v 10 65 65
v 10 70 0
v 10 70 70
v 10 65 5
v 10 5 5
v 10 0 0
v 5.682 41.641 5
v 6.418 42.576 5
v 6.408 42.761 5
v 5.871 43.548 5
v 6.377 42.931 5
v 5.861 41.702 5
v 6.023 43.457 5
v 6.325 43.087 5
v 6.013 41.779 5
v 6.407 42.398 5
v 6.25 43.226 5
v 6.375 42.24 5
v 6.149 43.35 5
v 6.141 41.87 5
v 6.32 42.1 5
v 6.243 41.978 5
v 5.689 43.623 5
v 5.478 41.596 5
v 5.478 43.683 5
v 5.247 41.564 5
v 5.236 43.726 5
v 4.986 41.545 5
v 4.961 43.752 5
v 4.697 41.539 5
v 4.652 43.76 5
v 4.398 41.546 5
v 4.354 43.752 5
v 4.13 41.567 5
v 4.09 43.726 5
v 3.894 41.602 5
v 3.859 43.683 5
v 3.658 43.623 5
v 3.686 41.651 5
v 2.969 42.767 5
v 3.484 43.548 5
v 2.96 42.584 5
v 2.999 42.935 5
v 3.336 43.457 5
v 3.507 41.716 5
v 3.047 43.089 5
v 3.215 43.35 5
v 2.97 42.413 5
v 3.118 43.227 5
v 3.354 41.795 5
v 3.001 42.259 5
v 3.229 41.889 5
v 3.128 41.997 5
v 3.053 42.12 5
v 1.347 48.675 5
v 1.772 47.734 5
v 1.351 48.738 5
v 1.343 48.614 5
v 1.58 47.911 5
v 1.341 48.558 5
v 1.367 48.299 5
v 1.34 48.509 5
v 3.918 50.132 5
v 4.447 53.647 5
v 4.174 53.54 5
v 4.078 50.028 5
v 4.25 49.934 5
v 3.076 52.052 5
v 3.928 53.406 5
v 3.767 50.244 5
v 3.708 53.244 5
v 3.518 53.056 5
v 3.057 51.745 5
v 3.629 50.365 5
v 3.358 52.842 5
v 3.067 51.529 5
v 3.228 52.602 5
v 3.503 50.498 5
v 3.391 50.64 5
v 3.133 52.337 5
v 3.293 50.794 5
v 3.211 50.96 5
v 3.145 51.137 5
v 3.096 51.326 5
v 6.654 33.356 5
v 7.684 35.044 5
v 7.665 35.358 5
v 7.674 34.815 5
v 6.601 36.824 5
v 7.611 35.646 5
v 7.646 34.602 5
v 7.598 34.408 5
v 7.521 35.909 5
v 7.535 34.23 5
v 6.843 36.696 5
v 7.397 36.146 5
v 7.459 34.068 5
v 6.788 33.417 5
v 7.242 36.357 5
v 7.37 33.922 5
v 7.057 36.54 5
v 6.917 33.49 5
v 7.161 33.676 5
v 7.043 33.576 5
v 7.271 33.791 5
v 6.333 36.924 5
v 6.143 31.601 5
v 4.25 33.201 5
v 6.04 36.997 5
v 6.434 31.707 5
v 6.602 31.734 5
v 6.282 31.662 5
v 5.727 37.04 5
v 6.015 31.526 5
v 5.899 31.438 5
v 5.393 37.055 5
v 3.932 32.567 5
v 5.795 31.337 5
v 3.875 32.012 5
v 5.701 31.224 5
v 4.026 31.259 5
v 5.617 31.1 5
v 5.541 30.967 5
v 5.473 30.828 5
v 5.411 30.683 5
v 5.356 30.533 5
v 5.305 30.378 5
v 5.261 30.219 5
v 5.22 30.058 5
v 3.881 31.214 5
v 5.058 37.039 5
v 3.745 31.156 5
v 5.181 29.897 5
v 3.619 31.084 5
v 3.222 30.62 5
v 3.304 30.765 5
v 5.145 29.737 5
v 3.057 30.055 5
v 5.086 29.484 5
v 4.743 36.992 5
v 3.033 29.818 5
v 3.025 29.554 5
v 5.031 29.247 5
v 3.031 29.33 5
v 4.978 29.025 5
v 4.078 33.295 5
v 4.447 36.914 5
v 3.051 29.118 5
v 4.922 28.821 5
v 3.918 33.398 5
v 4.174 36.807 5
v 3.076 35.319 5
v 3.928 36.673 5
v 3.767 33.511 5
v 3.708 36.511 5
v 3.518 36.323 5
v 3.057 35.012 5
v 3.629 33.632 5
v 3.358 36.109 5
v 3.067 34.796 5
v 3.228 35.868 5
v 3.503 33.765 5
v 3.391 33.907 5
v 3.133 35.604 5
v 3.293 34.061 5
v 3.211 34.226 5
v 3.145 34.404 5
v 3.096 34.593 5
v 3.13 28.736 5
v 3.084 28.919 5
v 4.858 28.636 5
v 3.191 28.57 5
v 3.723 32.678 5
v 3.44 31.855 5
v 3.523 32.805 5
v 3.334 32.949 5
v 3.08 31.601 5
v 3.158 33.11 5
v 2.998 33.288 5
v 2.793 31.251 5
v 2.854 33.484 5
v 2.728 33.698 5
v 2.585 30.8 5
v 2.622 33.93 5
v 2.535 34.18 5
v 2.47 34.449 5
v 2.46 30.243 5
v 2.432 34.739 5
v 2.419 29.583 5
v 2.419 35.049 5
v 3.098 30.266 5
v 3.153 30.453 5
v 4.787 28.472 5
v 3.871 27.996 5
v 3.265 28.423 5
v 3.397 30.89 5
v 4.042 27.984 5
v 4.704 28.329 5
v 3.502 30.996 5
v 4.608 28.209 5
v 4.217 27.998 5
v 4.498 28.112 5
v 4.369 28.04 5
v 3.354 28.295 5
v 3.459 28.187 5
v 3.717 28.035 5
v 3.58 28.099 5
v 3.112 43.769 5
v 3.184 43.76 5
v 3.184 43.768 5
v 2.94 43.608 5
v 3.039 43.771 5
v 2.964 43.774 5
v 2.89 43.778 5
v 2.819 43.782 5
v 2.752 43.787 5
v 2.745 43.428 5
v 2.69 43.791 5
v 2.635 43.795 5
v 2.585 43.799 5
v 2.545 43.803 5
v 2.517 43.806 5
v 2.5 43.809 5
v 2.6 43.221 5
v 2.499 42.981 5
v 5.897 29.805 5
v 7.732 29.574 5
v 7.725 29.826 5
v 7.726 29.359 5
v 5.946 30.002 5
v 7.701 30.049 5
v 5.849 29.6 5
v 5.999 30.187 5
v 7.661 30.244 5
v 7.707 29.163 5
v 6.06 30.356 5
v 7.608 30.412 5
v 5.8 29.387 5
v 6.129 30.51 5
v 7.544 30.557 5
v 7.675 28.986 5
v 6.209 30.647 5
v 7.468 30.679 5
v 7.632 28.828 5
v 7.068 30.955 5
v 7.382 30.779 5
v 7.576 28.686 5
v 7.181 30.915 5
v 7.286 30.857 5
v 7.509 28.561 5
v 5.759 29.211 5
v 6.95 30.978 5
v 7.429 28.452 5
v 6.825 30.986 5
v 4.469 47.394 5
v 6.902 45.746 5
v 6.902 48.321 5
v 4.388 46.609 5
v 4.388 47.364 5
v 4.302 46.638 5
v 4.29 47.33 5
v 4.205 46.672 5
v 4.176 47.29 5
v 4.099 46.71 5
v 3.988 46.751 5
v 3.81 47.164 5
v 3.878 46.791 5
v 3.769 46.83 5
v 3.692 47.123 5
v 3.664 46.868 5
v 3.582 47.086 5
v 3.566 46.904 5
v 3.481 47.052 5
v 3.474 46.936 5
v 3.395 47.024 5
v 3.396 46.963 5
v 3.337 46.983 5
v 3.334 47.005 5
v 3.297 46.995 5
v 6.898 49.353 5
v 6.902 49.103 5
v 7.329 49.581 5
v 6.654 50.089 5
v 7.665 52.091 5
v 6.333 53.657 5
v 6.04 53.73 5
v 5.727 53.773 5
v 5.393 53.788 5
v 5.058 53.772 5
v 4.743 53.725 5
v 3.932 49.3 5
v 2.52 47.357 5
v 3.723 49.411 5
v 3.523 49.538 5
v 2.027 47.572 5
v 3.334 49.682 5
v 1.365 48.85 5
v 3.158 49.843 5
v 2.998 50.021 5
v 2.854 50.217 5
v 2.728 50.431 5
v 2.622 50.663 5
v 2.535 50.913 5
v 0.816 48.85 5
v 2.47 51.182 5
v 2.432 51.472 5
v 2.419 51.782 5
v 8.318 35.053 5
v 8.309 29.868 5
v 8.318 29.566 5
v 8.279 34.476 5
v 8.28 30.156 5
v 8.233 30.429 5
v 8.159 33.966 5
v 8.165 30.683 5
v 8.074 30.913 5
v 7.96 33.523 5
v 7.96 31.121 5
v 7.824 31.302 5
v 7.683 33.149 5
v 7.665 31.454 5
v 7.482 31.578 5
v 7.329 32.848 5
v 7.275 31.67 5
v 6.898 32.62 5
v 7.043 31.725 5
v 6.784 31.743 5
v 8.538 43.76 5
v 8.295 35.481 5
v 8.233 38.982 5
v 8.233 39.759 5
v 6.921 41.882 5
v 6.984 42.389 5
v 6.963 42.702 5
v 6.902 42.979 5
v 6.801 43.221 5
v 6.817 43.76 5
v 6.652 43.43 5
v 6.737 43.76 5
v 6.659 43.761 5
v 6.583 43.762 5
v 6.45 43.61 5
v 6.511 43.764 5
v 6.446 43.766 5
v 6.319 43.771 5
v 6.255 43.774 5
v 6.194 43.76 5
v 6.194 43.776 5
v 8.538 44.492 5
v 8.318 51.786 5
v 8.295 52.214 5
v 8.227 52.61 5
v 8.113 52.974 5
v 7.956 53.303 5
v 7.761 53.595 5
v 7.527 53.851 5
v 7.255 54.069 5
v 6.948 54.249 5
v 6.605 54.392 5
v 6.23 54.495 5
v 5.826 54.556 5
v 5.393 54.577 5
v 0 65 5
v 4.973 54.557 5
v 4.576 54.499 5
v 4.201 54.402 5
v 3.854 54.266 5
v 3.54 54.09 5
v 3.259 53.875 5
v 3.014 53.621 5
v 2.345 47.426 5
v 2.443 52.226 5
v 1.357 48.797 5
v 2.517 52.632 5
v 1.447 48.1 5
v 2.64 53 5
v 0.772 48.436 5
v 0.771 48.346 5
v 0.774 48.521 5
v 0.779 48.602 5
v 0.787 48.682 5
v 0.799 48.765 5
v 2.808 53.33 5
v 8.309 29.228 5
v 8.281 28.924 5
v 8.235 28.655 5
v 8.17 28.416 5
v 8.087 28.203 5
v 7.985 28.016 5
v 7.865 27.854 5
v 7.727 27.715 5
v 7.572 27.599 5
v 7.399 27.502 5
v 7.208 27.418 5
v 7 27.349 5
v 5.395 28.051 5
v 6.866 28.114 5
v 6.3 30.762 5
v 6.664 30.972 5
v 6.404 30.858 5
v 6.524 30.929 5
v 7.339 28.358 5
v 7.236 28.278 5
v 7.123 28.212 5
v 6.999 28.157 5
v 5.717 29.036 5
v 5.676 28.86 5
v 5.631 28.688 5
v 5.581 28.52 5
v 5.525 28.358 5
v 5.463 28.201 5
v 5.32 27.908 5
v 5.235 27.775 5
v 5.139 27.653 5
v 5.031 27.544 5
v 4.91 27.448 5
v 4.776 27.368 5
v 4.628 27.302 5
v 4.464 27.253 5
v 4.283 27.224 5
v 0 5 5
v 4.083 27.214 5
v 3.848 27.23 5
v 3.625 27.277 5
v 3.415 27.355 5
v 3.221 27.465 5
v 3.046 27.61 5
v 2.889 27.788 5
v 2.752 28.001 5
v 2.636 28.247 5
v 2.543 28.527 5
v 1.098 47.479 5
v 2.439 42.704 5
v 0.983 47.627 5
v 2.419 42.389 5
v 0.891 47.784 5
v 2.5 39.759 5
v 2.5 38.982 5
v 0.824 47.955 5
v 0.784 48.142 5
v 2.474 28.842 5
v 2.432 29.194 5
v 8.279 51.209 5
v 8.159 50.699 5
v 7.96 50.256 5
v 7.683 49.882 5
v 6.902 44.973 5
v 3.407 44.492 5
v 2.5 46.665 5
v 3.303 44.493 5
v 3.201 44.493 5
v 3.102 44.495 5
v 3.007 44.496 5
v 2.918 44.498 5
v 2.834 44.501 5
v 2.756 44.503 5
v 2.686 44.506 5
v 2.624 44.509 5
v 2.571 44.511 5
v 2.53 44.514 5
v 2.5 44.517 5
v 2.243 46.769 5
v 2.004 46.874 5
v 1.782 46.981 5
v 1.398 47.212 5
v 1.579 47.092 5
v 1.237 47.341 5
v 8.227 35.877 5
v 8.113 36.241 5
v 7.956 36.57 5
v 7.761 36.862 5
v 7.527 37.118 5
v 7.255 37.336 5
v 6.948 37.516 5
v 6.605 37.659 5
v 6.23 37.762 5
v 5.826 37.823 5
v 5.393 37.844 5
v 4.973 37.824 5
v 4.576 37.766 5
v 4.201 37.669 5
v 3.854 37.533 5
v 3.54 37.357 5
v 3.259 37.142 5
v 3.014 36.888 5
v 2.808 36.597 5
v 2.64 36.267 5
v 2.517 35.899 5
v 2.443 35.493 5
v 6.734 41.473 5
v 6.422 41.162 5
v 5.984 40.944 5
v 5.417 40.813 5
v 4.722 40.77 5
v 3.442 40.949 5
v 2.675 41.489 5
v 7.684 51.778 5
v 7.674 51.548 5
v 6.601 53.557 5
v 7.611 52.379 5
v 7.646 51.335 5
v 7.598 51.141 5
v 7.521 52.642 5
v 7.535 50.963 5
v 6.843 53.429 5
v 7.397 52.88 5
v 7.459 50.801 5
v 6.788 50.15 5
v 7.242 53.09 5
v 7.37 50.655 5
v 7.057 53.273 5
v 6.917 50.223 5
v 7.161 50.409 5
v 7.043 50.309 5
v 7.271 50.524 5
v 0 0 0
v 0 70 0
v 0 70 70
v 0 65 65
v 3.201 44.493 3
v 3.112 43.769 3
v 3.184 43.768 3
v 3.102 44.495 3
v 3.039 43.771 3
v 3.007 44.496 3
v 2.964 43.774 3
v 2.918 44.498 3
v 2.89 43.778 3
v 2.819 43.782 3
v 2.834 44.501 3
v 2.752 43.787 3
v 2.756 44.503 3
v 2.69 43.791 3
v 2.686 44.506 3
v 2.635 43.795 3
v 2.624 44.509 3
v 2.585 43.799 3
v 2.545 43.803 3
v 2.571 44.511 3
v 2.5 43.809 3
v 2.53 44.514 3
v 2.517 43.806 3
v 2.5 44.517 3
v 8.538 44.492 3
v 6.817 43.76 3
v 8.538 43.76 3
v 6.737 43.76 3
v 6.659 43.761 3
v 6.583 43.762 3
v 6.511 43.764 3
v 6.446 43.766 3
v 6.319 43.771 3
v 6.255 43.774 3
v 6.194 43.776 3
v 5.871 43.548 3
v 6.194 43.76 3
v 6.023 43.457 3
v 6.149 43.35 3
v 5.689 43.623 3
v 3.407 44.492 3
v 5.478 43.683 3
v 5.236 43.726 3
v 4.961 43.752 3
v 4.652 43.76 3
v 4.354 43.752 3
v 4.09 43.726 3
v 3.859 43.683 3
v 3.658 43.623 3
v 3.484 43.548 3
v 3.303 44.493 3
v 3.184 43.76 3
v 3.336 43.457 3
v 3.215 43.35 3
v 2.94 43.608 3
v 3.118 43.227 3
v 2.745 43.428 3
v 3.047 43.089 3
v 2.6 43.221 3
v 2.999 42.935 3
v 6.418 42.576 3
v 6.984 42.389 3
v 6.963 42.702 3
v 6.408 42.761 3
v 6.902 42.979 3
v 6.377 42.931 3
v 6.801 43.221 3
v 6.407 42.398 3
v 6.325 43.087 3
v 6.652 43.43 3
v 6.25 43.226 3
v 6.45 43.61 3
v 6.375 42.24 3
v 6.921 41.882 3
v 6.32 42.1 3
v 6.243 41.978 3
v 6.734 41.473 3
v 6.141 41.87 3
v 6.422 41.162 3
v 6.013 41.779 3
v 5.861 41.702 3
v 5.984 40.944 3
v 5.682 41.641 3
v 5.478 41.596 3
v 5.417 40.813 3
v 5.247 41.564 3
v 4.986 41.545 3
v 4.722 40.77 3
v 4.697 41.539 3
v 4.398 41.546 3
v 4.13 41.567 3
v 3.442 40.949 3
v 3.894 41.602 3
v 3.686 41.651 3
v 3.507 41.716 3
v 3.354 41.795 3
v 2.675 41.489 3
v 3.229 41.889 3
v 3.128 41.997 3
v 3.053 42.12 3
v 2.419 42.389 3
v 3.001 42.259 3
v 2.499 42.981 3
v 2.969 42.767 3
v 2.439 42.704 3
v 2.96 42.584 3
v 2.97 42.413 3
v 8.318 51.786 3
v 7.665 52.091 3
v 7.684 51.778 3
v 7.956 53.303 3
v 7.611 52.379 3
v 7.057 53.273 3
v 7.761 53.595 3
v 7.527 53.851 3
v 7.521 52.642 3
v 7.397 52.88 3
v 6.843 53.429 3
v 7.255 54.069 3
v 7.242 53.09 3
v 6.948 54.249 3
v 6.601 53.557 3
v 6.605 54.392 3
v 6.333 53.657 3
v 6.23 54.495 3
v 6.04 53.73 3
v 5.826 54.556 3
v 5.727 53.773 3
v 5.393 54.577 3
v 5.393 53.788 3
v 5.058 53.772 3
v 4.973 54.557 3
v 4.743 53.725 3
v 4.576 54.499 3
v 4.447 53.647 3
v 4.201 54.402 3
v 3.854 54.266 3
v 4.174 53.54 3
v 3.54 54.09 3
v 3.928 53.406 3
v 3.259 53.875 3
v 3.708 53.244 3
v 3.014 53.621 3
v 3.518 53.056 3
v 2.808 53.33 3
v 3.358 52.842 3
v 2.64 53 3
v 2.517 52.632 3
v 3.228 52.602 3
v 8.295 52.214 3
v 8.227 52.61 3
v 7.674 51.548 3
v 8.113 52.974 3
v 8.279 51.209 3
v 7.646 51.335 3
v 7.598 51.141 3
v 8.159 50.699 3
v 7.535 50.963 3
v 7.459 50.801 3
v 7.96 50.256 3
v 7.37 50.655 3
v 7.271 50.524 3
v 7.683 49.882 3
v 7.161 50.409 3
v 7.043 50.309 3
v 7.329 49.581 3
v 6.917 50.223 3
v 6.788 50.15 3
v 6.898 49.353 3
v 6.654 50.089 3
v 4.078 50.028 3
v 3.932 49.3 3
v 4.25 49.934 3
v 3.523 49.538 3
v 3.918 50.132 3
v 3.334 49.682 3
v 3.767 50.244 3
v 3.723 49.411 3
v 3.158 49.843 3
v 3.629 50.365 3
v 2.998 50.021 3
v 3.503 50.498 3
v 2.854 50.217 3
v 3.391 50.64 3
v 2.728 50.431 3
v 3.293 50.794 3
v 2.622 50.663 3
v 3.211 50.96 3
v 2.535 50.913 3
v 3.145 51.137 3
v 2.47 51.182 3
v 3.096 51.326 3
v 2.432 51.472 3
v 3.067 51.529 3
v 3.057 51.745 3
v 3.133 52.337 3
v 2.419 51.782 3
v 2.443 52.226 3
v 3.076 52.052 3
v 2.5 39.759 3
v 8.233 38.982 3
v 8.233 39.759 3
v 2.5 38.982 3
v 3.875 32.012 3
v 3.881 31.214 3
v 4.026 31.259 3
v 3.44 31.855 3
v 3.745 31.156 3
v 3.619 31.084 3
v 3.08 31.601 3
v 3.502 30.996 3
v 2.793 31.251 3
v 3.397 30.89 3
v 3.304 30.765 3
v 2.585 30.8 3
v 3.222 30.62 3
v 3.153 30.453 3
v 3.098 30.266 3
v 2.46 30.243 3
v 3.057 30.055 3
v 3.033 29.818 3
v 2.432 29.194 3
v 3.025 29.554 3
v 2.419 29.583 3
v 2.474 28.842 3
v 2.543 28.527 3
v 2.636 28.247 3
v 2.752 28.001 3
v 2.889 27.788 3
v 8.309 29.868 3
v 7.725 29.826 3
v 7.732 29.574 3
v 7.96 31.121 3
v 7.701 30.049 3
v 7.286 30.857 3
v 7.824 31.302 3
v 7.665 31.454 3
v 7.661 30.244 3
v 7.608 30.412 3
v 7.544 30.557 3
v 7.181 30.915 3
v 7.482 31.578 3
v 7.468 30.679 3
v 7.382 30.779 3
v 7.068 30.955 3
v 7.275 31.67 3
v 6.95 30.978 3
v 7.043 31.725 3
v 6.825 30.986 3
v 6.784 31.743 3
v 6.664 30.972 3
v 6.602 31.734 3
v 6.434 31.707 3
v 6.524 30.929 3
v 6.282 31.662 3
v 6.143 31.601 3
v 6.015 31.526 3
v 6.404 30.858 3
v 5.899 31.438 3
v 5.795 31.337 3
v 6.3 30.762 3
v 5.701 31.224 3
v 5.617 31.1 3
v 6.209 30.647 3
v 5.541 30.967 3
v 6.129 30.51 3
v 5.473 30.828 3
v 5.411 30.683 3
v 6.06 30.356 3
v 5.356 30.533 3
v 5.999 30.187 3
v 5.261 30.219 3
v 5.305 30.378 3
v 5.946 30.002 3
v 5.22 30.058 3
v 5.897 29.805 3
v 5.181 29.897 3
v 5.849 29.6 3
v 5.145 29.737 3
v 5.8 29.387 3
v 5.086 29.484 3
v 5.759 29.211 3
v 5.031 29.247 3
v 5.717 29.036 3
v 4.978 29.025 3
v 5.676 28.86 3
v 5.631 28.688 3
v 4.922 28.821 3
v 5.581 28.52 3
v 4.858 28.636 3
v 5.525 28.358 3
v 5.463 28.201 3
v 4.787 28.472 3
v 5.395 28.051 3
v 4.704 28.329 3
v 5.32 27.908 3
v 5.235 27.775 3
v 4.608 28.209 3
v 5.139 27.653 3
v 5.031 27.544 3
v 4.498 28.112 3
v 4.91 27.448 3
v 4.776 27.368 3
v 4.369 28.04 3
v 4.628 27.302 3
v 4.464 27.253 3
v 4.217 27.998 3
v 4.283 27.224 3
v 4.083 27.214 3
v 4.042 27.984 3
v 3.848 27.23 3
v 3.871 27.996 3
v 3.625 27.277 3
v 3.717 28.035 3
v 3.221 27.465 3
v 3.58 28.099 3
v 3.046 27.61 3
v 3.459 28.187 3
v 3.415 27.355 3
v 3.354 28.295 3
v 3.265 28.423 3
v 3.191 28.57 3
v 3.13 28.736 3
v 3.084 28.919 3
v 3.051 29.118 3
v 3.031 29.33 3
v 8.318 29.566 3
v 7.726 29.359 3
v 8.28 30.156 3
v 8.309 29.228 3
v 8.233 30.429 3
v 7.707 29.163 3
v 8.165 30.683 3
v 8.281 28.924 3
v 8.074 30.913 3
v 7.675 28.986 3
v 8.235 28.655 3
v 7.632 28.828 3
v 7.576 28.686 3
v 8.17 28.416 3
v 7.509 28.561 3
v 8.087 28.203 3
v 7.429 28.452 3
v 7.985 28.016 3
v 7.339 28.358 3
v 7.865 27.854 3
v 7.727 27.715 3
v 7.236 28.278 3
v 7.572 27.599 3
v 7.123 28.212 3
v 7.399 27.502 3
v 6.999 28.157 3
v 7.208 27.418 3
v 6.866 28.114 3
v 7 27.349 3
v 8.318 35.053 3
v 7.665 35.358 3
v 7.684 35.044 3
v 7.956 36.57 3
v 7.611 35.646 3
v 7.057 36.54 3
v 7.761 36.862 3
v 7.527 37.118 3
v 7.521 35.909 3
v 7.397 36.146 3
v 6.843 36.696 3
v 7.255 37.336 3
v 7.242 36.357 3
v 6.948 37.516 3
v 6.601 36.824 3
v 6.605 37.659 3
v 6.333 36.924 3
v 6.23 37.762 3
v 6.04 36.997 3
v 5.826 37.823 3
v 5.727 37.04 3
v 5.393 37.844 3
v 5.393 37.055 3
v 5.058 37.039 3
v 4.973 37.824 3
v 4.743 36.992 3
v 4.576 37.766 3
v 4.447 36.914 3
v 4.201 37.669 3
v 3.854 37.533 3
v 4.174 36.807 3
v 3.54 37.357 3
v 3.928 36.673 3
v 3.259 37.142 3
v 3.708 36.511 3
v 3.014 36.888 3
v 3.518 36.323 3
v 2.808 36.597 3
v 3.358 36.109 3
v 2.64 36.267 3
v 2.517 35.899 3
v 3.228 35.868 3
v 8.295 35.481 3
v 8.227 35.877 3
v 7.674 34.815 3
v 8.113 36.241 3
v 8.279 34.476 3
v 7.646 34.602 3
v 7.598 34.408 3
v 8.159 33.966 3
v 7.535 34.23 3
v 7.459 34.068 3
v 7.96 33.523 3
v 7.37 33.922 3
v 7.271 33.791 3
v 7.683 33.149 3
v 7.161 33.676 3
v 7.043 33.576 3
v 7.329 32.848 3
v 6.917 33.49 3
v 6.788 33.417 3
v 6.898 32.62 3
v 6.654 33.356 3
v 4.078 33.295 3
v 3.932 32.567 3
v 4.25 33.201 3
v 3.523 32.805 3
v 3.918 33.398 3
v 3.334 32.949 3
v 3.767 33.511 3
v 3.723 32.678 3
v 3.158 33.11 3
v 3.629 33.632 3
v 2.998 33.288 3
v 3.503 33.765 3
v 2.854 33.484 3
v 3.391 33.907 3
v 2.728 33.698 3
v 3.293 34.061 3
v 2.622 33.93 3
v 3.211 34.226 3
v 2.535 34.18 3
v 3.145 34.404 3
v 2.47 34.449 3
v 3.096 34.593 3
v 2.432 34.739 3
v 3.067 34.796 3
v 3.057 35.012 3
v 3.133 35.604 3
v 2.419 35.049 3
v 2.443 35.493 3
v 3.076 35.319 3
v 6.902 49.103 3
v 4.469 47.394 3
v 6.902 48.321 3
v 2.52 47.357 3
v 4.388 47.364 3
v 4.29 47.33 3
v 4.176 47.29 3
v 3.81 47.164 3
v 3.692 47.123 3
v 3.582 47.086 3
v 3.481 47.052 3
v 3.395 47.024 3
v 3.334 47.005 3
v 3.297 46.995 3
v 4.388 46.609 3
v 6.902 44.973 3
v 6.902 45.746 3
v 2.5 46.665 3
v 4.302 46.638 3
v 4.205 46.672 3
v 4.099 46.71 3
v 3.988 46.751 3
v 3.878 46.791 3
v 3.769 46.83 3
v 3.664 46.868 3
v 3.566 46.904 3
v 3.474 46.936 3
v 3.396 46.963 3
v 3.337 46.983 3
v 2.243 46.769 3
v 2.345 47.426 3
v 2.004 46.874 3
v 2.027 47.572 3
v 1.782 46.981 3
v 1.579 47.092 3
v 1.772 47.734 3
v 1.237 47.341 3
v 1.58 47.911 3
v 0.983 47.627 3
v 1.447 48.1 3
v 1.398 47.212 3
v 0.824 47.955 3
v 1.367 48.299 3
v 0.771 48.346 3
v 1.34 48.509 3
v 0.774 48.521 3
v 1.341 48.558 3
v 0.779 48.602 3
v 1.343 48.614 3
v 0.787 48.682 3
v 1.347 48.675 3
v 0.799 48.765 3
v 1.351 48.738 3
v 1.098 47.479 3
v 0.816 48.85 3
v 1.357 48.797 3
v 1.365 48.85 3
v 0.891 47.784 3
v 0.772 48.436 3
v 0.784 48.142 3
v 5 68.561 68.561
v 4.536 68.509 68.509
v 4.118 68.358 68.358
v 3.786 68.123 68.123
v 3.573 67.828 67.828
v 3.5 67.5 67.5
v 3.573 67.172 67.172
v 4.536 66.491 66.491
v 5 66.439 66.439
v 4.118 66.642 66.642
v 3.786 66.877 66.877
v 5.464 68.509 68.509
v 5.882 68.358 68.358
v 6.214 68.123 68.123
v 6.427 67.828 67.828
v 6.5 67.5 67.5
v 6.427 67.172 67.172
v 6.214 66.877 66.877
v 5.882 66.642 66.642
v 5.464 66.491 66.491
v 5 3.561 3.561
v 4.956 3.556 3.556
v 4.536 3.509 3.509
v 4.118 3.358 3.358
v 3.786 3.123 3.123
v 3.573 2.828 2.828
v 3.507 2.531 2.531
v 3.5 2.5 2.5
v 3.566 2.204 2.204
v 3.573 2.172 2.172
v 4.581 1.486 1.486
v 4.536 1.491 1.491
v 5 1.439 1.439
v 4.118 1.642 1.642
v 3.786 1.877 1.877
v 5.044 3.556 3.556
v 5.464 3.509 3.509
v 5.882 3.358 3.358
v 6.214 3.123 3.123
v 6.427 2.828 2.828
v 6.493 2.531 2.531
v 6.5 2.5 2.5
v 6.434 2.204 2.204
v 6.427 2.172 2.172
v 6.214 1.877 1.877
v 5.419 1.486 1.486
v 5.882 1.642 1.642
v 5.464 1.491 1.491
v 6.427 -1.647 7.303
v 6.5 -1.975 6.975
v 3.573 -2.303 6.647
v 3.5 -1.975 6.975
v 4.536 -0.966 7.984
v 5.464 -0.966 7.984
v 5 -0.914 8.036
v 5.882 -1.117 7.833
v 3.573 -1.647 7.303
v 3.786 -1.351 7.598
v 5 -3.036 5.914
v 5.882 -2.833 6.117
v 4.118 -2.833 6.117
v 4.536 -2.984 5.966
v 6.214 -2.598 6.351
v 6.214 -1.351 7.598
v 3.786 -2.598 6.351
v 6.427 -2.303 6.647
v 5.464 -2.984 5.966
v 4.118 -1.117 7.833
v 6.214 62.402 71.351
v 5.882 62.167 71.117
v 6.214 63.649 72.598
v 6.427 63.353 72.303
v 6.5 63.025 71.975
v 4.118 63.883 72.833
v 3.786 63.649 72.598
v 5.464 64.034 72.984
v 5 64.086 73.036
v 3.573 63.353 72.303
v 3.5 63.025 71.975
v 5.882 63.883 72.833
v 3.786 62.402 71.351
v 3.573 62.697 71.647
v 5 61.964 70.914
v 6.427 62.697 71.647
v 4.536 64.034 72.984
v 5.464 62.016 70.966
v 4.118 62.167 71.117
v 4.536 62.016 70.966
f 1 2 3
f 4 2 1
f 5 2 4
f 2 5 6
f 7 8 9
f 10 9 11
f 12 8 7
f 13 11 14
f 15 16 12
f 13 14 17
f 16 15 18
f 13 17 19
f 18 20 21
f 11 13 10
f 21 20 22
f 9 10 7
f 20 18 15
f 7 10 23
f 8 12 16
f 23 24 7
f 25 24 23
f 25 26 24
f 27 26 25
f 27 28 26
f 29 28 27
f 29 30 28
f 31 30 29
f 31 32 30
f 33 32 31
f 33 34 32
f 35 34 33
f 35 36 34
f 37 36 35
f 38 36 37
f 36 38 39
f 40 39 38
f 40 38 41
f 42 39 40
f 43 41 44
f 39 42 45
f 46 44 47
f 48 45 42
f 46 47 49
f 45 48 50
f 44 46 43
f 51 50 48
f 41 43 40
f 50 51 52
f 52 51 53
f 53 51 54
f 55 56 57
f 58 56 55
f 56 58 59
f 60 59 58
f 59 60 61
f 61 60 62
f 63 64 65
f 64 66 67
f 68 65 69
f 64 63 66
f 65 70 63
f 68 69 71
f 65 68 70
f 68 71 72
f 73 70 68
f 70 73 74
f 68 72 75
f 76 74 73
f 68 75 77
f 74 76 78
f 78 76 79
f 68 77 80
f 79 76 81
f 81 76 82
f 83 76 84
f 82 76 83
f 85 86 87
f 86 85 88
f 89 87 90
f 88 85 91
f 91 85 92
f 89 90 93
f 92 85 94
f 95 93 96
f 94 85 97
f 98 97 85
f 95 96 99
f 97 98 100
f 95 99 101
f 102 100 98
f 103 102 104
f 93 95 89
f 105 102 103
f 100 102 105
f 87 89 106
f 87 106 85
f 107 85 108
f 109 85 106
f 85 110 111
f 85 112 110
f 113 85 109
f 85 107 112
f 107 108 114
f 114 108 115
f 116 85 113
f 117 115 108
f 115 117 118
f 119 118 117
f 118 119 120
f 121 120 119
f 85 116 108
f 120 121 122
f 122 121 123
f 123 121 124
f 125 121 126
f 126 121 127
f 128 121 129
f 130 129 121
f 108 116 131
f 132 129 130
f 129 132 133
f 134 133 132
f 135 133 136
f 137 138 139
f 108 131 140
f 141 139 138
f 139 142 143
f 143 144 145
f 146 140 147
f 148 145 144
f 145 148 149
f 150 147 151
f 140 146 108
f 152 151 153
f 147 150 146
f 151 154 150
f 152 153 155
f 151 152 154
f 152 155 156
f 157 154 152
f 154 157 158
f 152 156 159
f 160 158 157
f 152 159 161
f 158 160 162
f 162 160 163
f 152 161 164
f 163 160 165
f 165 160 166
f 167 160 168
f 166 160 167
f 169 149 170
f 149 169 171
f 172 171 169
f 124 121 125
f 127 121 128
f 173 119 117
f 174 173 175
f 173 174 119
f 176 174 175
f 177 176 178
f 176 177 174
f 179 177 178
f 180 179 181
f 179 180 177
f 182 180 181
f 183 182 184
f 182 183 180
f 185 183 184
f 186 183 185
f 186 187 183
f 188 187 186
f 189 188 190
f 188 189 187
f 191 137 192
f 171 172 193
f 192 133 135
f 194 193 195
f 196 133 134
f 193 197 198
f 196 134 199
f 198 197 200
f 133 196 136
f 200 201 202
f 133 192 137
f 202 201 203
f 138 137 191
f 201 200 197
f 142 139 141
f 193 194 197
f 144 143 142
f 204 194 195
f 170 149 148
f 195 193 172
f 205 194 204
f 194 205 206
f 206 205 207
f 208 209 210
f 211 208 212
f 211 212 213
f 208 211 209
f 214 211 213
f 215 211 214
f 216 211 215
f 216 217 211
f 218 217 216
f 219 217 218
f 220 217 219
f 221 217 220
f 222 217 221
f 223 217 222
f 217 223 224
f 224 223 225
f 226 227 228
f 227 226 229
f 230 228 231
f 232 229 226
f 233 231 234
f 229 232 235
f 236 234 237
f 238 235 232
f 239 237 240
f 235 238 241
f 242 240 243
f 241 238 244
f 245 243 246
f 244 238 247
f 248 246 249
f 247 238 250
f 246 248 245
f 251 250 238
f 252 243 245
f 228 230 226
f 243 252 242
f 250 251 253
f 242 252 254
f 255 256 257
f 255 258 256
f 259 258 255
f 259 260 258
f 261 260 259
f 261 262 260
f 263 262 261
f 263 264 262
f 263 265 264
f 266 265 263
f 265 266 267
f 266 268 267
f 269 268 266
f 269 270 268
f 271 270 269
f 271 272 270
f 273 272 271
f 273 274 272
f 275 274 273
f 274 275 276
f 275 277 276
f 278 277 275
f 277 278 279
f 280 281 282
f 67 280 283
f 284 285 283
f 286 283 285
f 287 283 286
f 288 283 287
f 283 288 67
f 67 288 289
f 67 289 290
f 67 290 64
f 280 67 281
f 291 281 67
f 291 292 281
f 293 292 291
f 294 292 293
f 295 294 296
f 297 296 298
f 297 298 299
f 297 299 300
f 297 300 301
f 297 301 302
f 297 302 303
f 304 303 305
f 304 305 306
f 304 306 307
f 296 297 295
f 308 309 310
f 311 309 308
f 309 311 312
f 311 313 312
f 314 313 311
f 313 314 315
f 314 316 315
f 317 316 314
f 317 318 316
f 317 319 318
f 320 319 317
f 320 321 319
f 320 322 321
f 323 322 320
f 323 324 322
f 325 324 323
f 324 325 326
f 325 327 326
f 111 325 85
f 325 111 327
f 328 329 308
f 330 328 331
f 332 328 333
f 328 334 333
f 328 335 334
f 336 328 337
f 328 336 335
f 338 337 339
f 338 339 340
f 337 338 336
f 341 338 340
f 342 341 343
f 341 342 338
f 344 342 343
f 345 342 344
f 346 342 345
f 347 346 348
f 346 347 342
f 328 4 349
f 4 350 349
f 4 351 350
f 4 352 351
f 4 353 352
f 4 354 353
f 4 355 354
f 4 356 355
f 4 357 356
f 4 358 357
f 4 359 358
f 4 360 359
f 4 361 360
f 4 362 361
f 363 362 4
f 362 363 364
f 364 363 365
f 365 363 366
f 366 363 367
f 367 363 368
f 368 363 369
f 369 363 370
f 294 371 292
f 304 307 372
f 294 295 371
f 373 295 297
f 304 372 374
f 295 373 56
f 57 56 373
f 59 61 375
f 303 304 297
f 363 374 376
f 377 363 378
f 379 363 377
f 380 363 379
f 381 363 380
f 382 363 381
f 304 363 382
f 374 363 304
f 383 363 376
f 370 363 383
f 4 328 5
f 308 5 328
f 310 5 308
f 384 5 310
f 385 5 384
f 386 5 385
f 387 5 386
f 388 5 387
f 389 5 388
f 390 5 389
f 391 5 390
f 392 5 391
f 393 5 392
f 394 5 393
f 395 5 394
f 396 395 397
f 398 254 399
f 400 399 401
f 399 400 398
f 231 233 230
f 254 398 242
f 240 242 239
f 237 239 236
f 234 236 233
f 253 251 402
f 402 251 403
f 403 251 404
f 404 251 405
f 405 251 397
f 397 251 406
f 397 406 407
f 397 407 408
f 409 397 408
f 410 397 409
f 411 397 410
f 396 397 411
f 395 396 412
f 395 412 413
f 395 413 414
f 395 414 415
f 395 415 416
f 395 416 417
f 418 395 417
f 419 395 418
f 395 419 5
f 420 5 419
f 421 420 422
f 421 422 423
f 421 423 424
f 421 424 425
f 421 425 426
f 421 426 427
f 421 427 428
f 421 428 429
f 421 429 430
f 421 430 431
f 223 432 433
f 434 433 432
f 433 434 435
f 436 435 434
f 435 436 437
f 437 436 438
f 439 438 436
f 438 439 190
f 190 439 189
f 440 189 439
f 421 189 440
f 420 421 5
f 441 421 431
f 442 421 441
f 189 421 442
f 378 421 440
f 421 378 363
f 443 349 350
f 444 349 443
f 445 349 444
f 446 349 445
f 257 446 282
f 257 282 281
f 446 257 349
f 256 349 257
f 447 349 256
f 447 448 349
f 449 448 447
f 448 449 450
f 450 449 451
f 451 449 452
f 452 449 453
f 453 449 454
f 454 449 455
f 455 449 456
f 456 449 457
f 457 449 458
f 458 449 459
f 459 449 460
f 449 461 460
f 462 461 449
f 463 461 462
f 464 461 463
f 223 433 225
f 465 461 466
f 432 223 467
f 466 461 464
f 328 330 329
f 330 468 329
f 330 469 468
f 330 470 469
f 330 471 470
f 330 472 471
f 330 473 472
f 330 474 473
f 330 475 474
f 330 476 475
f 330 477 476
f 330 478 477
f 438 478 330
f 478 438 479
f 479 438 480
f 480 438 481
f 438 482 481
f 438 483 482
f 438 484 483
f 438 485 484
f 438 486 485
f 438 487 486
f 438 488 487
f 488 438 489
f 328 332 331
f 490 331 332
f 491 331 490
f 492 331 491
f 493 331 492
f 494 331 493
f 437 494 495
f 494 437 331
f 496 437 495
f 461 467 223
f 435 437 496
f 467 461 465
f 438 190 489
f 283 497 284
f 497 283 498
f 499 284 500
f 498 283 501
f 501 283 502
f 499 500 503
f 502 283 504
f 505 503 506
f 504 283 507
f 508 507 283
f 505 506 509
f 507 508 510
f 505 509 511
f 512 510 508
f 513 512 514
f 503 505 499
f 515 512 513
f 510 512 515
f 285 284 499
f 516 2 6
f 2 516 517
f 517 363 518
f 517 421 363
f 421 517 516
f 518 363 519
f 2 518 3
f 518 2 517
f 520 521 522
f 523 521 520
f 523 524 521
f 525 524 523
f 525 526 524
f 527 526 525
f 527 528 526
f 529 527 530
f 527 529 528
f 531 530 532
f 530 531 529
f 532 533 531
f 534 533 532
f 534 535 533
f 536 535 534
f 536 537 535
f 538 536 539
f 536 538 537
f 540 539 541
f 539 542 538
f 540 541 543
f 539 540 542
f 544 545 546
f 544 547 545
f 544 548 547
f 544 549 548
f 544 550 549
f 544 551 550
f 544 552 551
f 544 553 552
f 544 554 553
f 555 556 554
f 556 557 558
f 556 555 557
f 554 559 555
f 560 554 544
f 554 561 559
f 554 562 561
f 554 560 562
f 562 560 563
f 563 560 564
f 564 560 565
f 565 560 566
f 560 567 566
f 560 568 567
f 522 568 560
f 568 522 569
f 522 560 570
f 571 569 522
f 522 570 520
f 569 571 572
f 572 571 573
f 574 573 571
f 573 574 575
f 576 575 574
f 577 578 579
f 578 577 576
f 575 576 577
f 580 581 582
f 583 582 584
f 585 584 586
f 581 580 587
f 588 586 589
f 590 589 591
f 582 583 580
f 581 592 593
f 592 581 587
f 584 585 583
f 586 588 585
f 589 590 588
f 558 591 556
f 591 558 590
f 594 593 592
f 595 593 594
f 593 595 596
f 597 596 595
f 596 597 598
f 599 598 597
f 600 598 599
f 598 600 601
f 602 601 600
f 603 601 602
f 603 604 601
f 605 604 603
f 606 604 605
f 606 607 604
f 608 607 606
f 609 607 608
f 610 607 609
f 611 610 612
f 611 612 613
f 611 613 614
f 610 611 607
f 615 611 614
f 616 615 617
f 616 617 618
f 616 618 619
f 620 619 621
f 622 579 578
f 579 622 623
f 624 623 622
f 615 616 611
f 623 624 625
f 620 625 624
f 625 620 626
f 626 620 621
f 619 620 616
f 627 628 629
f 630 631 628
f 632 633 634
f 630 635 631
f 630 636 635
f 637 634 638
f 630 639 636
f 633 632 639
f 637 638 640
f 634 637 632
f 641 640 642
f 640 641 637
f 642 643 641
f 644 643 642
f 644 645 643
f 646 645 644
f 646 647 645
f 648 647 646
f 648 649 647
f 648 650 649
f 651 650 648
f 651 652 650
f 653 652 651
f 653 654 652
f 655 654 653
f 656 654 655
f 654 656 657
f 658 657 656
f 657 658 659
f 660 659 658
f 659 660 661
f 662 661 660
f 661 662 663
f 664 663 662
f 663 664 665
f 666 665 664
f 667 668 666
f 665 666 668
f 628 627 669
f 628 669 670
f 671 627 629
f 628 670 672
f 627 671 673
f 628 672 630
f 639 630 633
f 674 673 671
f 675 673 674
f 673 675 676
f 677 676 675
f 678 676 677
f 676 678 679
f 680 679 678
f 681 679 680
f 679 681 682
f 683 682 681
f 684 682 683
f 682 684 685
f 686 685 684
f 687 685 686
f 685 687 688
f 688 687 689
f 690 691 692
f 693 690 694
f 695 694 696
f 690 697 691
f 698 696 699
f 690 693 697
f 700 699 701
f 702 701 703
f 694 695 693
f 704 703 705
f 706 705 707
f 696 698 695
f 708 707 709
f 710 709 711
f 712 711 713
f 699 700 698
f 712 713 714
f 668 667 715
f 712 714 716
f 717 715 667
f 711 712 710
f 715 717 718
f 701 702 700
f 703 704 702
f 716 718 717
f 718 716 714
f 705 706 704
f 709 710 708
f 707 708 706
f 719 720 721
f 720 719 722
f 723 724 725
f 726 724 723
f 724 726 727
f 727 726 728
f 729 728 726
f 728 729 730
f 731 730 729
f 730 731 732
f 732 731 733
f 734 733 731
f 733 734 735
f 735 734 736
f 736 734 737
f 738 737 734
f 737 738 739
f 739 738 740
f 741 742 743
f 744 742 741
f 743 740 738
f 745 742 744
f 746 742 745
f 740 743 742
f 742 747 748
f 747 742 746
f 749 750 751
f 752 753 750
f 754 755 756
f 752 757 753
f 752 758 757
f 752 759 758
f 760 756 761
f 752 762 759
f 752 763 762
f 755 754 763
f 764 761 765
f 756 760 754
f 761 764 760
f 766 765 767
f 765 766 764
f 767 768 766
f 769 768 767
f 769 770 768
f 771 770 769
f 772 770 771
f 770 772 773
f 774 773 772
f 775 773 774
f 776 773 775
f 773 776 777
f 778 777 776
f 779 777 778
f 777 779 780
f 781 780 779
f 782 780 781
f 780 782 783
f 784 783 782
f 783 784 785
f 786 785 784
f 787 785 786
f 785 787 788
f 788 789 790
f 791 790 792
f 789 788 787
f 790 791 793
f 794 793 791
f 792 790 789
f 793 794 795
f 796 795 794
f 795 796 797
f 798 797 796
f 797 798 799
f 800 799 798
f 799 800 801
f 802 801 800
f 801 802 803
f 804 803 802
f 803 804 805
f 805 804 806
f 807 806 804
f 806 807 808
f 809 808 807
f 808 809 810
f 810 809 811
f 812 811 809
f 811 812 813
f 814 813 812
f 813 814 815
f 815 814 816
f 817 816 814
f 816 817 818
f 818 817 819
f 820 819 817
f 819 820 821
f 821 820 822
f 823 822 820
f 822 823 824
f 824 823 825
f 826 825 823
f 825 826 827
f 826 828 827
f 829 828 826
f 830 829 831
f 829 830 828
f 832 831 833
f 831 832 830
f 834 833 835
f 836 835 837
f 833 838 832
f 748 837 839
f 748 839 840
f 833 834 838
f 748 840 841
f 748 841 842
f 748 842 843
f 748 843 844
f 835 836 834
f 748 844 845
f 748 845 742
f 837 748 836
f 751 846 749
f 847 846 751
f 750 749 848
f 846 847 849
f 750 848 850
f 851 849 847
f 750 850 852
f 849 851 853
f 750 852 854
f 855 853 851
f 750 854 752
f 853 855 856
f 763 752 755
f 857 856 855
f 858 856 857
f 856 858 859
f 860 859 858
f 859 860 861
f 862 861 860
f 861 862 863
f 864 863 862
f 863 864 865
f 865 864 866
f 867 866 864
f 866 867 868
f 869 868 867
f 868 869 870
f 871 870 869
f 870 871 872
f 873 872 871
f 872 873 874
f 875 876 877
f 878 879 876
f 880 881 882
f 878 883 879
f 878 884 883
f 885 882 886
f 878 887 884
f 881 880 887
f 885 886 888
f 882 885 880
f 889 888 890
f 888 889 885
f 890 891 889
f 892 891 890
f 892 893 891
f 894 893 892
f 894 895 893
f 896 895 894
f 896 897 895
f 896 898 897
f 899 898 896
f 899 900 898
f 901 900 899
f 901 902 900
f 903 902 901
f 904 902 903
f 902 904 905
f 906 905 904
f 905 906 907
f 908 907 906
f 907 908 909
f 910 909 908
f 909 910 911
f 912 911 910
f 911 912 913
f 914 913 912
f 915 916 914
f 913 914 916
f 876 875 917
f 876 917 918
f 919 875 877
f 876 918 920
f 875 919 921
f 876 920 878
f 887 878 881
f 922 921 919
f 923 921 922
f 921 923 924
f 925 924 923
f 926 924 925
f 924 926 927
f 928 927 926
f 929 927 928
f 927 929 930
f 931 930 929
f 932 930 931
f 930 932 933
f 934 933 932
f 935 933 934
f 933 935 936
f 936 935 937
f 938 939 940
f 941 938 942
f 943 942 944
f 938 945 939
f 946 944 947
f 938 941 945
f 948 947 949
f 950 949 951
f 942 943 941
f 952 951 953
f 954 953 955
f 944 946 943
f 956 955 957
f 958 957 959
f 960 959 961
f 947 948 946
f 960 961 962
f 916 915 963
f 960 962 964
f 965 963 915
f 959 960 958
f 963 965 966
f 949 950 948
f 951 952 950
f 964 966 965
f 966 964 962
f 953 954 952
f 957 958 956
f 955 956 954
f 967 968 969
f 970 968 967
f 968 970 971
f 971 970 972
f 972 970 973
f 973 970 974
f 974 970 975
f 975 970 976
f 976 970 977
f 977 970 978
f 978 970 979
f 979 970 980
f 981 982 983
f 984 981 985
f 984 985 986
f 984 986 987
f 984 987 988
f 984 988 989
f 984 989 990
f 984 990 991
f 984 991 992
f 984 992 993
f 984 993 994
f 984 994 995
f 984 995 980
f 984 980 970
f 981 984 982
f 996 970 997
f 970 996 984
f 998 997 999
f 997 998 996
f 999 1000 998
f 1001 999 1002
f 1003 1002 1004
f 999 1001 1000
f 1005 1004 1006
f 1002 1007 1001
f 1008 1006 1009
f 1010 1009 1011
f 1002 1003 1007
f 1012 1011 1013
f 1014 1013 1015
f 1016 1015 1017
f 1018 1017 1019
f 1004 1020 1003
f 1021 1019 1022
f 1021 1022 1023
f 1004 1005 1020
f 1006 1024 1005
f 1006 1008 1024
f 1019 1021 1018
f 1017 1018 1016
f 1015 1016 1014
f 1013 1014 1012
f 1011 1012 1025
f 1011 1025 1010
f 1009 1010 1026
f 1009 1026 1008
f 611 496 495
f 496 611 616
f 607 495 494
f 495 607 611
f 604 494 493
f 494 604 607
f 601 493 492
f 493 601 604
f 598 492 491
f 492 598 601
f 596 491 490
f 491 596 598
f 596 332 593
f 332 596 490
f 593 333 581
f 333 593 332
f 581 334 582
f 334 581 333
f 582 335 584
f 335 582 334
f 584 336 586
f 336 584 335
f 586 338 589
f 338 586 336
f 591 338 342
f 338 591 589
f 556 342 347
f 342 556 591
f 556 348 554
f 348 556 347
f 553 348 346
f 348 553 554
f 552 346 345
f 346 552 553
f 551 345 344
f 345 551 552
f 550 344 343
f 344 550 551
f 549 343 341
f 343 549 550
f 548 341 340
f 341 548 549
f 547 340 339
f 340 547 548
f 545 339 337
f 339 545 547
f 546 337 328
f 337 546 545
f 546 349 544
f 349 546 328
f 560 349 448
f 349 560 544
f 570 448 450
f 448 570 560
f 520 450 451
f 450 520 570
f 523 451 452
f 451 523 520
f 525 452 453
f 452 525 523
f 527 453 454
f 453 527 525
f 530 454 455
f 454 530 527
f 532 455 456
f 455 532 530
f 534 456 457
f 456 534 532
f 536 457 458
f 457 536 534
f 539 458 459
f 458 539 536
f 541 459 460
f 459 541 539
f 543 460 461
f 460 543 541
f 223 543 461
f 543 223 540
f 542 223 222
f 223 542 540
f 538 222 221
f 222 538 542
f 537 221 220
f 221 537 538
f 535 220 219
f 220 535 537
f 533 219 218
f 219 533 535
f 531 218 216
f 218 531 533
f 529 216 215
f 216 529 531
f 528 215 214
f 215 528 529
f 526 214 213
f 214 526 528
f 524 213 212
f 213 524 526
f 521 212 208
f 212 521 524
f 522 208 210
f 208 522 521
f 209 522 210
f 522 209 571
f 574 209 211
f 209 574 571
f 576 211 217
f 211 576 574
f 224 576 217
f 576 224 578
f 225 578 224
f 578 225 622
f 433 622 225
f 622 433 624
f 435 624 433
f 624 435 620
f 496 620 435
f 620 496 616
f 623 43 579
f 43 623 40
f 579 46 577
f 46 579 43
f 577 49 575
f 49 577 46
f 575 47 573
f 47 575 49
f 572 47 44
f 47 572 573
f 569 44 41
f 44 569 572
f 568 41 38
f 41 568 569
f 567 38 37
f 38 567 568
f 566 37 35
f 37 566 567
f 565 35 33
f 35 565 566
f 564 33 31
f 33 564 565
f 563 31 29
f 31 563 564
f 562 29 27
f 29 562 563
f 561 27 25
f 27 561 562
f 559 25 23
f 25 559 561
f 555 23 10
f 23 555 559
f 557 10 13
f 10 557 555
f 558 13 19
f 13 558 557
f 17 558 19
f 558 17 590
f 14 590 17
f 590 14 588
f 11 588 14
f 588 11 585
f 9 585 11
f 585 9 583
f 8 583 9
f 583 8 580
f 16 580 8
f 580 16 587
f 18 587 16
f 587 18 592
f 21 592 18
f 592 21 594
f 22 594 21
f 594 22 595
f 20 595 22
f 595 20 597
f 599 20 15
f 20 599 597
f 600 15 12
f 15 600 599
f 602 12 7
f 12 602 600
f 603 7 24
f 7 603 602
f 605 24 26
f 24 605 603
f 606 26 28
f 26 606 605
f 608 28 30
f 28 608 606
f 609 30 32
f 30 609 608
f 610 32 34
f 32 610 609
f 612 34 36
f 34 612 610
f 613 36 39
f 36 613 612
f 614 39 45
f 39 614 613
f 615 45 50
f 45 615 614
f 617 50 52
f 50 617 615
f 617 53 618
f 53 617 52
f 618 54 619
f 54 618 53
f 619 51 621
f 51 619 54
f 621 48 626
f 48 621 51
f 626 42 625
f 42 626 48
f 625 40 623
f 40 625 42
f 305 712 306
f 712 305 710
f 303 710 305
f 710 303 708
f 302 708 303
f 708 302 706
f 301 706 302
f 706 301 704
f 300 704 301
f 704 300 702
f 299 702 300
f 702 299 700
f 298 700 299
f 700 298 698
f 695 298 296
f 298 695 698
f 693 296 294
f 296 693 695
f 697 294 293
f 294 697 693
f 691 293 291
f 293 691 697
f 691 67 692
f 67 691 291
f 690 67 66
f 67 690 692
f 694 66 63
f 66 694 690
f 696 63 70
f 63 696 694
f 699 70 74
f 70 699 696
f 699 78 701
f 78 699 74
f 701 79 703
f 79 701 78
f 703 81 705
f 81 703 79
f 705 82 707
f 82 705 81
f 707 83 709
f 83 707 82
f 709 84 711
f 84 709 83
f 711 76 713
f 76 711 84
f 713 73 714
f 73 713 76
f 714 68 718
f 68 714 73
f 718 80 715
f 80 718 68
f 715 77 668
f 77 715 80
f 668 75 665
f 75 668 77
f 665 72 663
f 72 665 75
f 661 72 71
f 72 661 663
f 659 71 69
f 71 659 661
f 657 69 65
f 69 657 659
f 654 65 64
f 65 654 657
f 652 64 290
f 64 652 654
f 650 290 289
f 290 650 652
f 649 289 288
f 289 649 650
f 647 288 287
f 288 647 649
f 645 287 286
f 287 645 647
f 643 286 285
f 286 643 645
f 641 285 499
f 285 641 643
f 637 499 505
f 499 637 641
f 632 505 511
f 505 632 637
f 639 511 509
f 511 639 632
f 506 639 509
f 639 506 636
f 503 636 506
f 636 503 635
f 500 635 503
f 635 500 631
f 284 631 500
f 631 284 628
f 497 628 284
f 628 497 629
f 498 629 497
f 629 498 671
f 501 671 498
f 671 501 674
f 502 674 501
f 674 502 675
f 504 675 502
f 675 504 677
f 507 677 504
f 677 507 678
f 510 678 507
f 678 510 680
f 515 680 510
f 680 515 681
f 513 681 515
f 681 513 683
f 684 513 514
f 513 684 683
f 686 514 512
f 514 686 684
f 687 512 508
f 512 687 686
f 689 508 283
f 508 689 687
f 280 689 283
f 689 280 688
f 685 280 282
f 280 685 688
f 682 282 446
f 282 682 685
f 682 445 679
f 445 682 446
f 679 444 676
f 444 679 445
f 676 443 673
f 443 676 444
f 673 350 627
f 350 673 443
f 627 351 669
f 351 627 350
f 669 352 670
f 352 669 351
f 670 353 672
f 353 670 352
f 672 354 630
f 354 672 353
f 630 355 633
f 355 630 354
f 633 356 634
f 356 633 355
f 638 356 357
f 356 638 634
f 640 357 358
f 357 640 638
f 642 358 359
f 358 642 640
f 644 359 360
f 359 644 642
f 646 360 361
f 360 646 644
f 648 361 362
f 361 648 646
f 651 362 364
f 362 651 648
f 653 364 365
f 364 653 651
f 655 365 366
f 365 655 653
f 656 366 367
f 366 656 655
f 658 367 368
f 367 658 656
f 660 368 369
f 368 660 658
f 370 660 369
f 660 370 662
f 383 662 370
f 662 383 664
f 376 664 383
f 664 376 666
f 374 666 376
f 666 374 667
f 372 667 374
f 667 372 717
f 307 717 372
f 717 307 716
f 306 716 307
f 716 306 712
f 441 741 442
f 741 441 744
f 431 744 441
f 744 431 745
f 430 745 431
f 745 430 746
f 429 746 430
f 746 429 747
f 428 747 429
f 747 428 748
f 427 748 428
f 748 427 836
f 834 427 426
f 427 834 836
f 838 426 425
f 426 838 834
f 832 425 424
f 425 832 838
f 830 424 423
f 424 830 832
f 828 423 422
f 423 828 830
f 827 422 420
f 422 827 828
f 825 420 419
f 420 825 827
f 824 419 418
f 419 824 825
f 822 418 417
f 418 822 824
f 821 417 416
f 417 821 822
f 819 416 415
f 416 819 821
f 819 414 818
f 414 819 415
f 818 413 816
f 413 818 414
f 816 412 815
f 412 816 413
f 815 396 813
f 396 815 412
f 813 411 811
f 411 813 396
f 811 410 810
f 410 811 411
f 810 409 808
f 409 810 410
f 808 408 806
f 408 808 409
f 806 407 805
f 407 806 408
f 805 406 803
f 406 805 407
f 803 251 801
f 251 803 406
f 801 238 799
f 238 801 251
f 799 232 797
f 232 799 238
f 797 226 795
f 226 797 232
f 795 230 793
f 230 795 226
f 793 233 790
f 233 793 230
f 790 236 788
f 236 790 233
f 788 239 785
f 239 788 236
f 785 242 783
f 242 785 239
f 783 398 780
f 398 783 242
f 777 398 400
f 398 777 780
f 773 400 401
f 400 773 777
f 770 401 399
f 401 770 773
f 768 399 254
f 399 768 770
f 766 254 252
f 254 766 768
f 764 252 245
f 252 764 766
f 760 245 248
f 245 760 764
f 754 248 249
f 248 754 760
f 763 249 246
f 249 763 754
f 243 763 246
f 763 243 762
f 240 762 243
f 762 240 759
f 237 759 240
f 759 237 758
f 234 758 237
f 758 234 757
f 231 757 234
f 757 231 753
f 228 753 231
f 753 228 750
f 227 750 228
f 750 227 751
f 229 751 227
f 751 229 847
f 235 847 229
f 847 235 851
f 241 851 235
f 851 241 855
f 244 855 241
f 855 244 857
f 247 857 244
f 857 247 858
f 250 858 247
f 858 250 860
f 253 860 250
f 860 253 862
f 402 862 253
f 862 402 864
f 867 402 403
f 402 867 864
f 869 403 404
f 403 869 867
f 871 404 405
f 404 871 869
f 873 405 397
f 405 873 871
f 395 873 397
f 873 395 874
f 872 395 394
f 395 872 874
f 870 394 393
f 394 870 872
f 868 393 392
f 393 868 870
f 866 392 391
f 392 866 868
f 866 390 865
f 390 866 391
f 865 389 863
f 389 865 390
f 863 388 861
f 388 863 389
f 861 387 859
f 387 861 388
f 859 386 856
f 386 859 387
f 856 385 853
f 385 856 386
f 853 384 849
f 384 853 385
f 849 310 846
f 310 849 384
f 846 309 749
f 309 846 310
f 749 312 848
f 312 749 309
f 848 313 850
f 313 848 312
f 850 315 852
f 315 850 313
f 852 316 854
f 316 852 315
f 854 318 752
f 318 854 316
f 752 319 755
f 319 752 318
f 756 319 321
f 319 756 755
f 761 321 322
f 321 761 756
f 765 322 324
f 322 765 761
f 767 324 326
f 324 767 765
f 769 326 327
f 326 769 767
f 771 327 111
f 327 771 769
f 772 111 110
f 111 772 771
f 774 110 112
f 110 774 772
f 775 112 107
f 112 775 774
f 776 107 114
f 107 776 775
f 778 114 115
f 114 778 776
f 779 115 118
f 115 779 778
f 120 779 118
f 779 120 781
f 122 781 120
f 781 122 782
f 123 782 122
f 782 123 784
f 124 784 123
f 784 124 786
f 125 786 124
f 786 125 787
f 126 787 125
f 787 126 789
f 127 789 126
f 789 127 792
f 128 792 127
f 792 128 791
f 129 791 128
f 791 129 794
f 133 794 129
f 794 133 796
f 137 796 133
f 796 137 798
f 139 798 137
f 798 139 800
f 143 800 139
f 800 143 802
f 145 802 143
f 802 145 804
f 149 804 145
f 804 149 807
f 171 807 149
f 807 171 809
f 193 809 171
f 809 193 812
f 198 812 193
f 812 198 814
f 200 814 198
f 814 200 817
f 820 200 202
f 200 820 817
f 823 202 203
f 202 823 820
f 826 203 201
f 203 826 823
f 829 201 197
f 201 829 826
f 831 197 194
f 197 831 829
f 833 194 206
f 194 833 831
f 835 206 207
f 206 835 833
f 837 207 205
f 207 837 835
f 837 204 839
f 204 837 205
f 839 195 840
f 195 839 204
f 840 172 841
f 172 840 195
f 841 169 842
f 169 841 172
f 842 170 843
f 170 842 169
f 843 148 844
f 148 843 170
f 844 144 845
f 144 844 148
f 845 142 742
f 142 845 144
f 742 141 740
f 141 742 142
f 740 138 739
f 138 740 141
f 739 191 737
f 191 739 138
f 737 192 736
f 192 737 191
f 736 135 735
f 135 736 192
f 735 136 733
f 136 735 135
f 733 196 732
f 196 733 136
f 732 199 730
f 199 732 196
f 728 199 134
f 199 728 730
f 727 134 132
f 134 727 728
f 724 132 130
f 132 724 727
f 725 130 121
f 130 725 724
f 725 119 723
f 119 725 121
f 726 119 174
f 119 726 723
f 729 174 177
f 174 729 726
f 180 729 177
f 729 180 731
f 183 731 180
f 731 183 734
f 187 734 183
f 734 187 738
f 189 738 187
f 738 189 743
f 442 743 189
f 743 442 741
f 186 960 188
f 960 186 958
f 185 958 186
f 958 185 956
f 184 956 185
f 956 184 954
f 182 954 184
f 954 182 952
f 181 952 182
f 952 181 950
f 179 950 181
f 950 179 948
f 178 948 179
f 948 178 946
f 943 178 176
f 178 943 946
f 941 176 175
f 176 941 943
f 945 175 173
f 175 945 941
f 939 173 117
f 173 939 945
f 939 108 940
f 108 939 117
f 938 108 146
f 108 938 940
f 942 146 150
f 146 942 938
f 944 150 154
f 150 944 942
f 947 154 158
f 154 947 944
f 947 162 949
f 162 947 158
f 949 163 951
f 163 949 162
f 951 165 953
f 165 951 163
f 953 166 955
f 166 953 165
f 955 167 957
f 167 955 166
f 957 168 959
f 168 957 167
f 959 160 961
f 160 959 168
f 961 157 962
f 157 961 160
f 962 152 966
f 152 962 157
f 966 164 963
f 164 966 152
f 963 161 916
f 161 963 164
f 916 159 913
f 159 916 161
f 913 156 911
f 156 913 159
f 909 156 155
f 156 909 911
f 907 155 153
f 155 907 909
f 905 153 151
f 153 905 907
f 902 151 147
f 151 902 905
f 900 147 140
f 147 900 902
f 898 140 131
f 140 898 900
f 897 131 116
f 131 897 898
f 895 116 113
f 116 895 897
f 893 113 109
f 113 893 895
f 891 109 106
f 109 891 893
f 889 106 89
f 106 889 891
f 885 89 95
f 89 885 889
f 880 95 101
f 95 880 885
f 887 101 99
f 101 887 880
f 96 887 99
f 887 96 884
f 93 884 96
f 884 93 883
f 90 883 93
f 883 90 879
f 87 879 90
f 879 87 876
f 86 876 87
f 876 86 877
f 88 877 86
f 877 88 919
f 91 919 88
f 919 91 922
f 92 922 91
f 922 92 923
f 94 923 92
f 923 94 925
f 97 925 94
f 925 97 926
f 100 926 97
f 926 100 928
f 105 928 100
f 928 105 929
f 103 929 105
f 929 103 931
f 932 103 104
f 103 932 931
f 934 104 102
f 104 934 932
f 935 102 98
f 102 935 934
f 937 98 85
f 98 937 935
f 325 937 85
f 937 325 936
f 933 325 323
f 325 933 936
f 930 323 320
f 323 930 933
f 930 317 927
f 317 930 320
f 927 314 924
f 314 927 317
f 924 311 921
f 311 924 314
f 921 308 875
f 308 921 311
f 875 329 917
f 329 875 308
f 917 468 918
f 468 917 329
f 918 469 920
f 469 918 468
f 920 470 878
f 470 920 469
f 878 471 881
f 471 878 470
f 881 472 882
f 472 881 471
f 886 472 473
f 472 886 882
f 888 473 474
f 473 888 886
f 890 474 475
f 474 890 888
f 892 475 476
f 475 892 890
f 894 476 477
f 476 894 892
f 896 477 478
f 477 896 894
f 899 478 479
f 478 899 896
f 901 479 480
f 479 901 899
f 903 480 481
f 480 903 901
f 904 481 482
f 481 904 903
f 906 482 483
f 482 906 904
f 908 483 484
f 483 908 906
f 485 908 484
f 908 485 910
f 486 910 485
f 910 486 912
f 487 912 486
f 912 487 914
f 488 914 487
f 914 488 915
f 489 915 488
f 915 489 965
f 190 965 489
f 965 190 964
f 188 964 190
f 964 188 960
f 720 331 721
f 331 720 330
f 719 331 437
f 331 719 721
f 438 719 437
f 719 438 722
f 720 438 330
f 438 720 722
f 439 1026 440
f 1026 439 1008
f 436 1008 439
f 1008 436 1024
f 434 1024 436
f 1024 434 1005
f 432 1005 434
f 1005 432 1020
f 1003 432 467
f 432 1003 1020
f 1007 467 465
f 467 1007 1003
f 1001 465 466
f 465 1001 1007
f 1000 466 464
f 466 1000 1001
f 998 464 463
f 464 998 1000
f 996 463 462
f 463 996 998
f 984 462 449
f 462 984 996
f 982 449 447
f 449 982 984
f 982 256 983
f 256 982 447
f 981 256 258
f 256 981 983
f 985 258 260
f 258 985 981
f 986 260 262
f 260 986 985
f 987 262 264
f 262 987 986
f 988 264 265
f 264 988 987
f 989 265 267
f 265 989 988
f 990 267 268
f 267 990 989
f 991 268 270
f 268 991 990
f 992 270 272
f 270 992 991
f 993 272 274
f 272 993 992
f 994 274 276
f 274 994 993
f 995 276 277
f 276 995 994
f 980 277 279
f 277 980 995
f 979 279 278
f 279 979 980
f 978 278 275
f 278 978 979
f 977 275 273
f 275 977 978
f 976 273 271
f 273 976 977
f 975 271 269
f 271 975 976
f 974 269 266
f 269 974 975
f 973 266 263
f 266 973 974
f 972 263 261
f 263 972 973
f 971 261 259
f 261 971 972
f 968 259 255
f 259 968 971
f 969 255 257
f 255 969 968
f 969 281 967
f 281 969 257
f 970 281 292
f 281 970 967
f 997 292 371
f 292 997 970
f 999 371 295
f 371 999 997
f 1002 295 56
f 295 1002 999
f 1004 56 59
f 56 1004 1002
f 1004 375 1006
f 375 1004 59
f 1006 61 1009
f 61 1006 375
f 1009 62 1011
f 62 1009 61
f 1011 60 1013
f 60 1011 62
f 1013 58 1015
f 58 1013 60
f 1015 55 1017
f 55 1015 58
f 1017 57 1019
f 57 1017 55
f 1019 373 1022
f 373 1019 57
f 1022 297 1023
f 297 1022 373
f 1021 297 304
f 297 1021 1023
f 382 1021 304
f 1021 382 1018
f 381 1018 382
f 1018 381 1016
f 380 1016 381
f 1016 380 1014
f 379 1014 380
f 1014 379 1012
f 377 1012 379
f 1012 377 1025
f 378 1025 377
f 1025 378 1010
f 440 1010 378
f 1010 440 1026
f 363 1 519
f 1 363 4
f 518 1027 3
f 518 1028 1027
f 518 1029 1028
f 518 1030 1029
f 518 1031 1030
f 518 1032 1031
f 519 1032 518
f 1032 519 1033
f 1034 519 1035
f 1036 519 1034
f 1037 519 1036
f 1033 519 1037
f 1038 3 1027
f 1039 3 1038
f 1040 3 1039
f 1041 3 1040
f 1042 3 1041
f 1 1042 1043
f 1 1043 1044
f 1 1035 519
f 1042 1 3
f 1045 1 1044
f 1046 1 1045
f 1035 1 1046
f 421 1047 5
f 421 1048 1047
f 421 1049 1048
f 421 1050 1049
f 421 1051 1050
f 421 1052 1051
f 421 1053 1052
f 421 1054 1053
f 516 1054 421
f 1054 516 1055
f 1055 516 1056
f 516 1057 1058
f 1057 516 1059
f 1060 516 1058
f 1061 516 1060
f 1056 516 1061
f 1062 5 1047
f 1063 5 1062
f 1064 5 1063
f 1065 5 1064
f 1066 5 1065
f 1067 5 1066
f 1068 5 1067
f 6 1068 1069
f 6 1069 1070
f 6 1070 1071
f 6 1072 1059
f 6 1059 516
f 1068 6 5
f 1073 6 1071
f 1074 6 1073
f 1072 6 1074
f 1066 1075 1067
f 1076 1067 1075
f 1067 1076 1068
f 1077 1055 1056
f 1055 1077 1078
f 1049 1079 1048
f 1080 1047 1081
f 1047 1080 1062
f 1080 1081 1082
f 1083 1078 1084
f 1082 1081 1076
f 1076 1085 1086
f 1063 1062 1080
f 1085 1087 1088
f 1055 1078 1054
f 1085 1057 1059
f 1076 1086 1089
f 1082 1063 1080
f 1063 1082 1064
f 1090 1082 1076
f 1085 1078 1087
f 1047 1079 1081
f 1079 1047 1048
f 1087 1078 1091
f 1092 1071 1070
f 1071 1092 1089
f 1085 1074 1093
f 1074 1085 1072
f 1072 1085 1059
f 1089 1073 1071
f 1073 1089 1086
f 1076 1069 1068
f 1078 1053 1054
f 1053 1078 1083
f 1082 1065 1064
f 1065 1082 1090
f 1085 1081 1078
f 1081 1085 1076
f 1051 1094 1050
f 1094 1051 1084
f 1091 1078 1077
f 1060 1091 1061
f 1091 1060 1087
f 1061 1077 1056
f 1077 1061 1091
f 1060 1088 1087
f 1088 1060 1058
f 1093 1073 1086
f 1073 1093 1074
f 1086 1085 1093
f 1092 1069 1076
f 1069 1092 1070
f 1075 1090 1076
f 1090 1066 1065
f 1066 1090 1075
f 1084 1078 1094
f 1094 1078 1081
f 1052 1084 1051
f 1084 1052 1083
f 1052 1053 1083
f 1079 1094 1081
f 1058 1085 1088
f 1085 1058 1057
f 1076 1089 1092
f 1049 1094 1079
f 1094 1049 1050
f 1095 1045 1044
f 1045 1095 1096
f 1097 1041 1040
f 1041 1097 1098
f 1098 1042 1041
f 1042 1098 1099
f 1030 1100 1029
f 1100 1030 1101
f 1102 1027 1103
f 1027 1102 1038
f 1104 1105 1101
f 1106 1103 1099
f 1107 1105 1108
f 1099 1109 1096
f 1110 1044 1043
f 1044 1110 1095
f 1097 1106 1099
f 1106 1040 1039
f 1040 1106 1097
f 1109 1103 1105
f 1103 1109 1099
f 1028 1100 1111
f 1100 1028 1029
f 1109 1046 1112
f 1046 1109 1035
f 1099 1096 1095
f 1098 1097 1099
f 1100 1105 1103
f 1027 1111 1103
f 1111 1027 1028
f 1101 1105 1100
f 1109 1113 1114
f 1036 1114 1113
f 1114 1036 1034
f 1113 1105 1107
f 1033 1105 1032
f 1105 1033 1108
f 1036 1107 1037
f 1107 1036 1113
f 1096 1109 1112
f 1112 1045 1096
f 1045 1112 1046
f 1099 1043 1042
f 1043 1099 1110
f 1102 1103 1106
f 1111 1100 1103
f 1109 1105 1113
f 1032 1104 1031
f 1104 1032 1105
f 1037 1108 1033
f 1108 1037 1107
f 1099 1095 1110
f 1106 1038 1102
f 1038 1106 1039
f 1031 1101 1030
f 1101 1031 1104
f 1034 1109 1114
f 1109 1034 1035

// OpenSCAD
union() {
  union() difference() { 
    union() { 
      union() difference() {
        // Base
        cube(size = [10,70,5], center = false);
        // CybICS Text
        translate ([2.5,55,3]) {
          rotate([0,0,270])
            linear_extrude(height = 10) {
              text("CybICS", font = "Liberation Sans", size = 6);
        }
      } 
          
      }
      // Back
      translate([0,65,0]) 
        cube(size = [10,5,70], center = false);
    }
    union() {
      translate([0,0,0])    
        rotate([45,0,0])
          cube(size = [10,100,5], center = false); 
    }
  }
  $fn=20;
  translate([5,0.5,4.5]) 
    rotate([45,0,0])
      cylinder(h = 7, r=1.5, center = true);
  translate([5,65.5,69.5]) 
    rotate([45,0,0])
      cylinder(h = 7, r=1.5, center = true);
}
